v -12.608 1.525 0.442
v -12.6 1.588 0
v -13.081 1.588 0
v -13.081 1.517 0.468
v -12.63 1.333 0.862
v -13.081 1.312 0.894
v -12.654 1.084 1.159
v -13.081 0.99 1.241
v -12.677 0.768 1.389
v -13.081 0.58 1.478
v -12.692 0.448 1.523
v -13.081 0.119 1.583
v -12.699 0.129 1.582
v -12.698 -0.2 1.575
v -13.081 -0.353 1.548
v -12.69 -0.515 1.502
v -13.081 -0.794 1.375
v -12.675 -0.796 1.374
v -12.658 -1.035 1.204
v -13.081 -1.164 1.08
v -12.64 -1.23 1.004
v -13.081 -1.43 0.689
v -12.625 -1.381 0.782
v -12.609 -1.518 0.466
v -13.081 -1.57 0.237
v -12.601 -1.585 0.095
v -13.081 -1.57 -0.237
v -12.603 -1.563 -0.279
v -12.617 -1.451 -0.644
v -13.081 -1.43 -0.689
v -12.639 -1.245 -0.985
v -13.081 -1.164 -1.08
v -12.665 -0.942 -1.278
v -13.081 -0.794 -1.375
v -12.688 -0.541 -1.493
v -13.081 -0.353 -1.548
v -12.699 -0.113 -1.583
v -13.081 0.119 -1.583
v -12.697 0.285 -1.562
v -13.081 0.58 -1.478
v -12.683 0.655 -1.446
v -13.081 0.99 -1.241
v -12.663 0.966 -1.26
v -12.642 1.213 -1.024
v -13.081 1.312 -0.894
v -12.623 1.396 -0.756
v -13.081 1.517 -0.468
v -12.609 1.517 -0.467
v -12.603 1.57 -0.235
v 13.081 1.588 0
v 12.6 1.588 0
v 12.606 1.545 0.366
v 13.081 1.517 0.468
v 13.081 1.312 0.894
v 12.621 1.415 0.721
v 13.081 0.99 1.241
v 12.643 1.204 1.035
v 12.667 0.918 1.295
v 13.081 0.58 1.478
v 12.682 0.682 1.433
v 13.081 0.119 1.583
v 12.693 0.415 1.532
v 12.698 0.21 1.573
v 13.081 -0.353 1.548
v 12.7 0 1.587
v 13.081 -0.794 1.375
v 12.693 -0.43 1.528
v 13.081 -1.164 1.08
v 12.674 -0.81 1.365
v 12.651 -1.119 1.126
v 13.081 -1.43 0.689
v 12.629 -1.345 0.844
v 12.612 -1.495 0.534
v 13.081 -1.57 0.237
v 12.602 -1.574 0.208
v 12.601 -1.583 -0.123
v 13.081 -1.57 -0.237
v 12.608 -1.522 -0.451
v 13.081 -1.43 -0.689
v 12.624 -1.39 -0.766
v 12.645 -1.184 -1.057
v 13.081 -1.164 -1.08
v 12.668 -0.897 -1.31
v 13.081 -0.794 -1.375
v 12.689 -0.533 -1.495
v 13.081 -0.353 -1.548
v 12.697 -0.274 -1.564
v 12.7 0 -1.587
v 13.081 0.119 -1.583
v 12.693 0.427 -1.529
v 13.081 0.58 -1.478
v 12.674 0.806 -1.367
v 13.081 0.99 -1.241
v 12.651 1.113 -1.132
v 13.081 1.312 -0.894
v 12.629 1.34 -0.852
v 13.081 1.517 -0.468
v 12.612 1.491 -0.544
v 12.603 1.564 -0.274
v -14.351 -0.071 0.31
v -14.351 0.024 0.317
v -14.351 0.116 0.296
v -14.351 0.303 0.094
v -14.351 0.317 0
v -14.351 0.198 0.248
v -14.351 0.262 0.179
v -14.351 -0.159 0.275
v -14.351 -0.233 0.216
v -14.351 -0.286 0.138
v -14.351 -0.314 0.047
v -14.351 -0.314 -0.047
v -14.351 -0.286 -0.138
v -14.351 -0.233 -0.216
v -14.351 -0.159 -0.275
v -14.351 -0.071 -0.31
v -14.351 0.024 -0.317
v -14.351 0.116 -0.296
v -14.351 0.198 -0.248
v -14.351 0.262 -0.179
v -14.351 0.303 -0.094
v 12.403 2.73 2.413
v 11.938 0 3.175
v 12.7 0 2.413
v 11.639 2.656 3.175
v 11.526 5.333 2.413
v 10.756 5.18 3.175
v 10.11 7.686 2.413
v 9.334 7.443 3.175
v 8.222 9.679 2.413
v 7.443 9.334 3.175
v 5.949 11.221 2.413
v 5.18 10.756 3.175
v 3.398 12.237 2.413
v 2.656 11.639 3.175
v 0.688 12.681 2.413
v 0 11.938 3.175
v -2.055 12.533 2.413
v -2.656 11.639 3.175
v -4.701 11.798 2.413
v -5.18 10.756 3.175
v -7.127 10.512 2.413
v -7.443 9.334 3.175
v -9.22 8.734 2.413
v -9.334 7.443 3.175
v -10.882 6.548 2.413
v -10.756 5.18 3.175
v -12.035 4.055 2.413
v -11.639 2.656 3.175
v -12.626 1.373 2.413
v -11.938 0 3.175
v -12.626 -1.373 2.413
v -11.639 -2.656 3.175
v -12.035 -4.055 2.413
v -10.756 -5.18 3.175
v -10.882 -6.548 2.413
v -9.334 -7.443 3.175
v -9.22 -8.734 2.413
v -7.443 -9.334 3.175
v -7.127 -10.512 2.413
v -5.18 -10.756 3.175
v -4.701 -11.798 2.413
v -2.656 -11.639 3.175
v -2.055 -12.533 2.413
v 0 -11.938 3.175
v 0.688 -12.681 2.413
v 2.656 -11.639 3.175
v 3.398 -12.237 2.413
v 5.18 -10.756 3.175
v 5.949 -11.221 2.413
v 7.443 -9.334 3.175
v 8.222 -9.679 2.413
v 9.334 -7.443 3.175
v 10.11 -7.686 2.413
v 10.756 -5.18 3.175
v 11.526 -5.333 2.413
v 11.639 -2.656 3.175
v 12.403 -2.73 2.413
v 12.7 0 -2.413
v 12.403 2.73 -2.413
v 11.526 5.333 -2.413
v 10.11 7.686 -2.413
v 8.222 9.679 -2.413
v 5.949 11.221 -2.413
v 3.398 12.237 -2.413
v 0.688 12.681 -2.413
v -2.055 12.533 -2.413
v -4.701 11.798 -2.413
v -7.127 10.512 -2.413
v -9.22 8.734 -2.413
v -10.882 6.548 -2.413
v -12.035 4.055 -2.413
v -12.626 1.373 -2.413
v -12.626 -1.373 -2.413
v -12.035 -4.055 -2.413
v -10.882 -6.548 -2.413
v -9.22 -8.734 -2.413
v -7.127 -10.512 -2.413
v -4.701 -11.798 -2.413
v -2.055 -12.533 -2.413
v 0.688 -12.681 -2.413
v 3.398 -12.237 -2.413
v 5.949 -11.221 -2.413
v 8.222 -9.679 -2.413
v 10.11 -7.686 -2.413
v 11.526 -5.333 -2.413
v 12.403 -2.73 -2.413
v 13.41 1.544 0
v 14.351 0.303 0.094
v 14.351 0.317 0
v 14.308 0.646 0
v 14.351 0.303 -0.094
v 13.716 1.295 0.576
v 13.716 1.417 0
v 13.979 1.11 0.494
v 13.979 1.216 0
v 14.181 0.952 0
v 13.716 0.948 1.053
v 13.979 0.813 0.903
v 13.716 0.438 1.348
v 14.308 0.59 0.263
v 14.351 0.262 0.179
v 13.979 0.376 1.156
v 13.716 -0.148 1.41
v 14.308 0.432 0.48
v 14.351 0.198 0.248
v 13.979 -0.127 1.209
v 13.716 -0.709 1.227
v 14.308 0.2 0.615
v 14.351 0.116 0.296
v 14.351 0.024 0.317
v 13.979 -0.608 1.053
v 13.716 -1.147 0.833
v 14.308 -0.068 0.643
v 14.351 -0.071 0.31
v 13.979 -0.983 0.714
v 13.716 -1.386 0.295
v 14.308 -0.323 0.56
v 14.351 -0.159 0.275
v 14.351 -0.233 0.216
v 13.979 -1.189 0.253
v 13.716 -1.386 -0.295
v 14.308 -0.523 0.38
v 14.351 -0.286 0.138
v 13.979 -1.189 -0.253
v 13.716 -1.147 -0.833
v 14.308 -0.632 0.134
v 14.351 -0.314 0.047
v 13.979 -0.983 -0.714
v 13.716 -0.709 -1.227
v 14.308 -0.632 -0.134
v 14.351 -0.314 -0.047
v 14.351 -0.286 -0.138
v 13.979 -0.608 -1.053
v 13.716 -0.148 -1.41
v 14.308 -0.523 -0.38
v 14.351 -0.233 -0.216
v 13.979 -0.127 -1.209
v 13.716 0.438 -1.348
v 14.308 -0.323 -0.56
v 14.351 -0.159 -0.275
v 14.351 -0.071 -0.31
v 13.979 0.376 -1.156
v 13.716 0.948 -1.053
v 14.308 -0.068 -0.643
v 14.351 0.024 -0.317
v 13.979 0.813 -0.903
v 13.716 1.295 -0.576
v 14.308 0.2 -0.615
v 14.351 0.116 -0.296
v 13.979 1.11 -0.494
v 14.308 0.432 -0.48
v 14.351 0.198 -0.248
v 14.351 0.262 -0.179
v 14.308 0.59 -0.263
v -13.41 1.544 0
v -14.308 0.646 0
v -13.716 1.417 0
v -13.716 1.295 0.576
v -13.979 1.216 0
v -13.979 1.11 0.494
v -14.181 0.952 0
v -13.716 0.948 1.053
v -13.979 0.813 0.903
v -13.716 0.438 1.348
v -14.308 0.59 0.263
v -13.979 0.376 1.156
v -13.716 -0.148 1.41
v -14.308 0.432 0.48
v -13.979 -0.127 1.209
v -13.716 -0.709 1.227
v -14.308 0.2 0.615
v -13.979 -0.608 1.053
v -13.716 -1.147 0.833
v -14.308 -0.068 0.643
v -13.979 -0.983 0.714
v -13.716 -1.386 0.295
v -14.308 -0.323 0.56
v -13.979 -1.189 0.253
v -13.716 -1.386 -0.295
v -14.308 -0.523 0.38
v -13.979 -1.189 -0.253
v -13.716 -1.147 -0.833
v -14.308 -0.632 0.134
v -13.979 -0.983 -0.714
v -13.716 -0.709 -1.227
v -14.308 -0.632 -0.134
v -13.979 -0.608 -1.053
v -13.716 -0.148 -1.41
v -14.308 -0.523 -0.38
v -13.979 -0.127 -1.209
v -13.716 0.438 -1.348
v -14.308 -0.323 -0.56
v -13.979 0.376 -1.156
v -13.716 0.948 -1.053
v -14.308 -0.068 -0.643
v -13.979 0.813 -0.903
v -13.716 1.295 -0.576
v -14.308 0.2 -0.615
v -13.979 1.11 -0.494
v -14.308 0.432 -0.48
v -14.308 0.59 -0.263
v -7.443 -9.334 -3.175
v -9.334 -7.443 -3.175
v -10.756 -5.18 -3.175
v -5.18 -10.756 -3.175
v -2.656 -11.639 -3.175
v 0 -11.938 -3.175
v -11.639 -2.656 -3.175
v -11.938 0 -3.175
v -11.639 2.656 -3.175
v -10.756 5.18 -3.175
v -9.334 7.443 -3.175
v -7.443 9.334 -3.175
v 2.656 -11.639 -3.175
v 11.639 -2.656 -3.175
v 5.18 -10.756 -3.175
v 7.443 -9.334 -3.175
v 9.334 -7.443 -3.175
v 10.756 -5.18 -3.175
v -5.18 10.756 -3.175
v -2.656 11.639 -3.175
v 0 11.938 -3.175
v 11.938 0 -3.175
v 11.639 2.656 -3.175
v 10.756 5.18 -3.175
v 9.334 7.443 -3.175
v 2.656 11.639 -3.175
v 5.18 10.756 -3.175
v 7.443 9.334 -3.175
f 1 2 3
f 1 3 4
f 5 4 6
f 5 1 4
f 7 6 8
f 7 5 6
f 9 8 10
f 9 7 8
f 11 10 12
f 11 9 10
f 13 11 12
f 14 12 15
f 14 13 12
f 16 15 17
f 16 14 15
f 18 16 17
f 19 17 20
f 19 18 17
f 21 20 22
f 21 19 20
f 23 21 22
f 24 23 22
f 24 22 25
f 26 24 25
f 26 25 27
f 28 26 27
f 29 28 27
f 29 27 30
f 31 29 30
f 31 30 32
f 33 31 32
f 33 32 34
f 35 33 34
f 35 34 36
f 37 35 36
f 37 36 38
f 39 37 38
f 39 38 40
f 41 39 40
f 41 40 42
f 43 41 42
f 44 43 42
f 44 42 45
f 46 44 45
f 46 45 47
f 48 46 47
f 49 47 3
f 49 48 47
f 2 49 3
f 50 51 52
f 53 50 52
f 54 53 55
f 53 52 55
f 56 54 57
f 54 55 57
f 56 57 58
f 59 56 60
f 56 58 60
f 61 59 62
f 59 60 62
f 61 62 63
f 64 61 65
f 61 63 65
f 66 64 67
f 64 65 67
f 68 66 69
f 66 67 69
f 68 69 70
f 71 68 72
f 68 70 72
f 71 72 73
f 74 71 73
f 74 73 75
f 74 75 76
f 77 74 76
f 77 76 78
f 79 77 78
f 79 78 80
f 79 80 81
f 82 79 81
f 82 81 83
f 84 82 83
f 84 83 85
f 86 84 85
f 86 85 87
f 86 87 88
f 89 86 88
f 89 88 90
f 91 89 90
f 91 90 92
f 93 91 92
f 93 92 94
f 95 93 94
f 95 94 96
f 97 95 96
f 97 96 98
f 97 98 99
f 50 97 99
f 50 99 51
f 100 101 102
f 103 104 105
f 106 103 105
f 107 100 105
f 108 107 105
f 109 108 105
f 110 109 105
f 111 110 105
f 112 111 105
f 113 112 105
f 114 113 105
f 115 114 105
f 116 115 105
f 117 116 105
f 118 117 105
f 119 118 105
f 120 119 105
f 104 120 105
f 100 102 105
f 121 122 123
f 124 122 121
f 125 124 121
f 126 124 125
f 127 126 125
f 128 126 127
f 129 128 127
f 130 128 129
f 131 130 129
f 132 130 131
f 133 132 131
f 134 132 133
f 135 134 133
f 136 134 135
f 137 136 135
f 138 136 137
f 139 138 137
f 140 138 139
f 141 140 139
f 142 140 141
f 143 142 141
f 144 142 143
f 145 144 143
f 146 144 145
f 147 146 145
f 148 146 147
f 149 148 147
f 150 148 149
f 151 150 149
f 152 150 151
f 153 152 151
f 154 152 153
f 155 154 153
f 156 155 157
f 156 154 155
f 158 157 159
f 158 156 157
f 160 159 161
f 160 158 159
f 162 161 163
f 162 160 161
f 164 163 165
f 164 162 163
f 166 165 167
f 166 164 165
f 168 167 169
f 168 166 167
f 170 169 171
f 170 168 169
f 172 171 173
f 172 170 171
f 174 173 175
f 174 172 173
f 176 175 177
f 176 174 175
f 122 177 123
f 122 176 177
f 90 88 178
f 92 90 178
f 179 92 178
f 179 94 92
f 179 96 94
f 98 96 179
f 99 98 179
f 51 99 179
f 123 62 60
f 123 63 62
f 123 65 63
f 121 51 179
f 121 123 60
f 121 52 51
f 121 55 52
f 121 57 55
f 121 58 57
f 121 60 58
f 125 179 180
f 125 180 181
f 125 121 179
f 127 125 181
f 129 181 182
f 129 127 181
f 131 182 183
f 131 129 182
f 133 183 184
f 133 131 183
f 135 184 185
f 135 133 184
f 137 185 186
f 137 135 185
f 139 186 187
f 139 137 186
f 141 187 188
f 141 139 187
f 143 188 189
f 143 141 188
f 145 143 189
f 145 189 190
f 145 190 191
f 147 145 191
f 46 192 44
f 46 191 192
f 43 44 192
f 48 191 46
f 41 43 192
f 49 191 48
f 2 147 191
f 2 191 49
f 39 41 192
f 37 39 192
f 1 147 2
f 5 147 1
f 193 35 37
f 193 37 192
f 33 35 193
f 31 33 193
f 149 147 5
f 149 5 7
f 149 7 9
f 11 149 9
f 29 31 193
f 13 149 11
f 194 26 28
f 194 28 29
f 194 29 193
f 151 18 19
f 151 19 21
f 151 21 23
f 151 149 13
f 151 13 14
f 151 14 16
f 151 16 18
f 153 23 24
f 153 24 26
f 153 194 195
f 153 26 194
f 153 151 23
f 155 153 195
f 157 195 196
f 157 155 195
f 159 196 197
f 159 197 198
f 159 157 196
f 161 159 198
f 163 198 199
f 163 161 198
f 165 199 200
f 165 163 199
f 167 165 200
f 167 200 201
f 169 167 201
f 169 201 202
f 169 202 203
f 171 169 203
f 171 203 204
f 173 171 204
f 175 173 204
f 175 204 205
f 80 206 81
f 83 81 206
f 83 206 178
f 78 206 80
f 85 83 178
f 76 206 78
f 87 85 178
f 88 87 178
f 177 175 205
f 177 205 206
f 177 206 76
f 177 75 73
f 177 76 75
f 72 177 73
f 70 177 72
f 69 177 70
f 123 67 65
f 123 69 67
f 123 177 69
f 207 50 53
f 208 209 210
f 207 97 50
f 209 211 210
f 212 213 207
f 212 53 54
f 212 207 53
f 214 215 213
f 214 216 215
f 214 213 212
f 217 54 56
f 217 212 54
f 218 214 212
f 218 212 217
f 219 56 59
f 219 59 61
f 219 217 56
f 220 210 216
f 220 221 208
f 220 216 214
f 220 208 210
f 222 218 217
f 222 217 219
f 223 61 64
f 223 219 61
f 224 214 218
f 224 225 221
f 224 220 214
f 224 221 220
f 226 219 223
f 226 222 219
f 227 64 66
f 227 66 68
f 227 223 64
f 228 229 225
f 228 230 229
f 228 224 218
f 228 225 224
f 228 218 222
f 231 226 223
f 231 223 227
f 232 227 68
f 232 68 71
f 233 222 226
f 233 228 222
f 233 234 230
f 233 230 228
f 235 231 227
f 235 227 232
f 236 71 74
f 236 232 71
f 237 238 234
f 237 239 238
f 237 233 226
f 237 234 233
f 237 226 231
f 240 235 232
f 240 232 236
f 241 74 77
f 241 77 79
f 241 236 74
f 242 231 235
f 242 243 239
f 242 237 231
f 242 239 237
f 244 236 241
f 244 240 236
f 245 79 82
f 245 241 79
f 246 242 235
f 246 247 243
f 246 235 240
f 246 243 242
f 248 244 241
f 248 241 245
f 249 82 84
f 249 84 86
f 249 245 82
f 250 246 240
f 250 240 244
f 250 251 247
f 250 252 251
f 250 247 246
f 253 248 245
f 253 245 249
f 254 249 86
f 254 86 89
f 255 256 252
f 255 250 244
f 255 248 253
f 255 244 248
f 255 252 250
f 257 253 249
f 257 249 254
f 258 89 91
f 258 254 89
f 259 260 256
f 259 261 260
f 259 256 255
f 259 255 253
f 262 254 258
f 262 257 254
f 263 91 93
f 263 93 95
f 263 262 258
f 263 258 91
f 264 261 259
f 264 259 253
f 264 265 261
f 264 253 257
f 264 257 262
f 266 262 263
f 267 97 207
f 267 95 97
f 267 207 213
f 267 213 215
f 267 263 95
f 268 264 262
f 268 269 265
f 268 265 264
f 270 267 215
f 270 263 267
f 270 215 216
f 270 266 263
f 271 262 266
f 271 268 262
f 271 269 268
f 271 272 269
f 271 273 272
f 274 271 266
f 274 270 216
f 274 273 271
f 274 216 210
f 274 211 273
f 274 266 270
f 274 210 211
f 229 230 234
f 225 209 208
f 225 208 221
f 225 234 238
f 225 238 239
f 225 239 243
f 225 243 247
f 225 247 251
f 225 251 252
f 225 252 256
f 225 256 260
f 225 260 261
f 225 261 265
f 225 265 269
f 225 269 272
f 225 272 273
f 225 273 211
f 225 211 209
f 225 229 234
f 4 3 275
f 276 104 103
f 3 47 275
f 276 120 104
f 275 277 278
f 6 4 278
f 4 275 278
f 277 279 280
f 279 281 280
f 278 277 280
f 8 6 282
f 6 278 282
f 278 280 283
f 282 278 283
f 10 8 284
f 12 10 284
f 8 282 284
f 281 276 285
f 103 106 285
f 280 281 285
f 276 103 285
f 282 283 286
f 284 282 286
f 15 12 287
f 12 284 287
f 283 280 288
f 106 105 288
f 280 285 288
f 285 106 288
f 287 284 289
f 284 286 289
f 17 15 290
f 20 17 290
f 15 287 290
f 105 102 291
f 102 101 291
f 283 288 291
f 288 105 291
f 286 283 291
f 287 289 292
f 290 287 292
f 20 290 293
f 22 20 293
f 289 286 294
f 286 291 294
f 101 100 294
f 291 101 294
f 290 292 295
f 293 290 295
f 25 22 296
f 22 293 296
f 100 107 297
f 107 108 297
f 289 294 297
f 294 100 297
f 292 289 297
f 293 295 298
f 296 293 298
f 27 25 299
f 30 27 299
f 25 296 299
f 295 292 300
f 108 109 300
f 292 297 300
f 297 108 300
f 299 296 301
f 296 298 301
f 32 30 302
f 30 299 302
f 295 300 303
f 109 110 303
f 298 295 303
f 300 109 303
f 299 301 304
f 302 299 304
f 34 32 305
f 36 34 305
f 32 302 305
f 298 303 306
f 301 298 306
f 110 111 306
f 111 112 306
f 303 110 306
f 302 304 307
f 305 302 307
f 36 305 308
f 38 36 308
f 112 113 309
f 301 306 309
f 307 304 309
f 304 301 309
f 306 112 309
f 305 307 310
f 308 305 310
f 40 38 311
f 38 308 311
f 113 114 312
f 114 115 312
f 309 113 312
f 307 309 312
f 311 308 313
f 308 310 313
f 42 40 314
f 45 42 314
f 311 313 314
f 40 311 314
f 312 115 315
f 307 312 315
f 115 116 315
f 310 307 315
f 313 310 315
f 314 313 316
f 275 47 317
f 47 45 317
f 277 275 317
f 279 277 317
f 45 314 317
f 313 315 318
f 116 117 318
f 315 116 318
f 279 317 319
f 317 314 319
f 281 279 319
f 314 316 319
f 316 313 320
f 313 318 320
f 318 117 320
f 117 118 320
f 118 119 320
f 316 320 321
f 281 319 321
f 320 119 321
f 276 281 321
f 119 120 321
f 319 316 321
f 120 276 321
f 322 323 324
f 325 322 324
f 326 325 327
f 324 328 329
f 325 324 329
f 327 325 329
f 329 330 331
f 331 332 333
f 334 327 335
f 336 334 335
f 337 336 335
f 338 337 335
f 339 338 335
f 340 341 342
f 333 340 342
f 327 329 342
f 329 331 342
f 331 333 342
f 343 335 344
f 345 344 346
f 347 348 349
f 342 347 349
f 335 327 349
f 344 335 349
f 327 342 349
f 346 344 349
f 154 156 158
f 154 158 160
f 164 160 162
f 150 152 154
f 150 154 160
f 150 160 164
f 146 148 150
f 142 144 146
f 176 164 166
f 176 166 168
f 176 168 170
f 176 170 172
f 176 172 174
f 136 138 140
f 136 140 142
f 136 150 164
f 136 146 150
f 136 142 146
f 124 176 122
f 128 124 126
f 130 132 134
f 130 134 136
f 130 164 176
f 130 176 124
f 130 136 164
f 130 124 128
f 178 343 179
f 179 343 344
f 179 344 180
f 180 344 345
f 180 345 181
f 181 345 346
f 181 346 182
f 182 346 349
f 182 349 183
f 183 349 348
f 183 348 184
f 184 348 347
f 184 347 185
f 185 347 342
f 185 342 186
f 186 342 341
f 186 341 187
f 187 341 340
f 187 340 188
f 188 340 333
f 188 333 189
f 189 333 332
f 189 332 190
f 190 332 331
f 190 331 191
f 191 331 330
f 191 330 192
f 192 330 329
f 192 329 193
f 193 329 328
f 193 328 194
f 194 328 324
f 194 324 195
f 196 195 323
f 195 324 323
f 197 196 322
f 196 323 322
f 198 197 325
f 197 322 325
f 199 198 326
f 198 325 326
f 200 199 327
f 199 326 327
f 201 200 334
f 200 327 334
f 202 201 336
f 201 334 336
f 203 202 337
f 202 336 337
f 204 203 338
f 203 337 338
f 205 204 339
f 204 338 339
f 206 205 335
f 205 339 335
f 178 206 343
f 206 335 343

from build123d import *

# Parameters (mm, degrees)
F0_R          = 12.7
F1_DEPTH      = 3.175
F2_R          = 1.5875
F3_DEPTH      = 14.351
F3_DEPTH_BACK = 14.351
F4_R          = 1.27
F5_SIZE       = 0.762


with BuildPart() as f1:
    # F0 (on Top) → F1 (new body, symmetric)
    with BuildSketch(Plane.XY):
        Circle(F0_R)
    extrude(amount=F1_DEPTH, both=True)

    # F2 (on Right) → F3 (join, two sides)
    with BuildSketch(Plane.YZ) as f3_sk:
        Circle(F2_R)
    extrude(amount=-F3_DEPTH)
    extrude(f3_sk.sketch, amount=F3_DEPTH_BACK)

    # F4
    f4_edges = [f1.edges().sort_by_distance(p)[0] for p in [
        (-14.351, -1.5875, 0),
        (14.351, -1.5875, 0),
    ]]
    fillet(f4_edges, radius=F4_R)

    # F5
    f5_edges = [f1.edges().sort_by_distance(p)[0] for p in [
        (-12.7, 0, 3.175),
        (-12.7, 0, -3.175),
    ]]
    chamfer(f5_edges, length=F5_SIZE)


solid = f1.part
